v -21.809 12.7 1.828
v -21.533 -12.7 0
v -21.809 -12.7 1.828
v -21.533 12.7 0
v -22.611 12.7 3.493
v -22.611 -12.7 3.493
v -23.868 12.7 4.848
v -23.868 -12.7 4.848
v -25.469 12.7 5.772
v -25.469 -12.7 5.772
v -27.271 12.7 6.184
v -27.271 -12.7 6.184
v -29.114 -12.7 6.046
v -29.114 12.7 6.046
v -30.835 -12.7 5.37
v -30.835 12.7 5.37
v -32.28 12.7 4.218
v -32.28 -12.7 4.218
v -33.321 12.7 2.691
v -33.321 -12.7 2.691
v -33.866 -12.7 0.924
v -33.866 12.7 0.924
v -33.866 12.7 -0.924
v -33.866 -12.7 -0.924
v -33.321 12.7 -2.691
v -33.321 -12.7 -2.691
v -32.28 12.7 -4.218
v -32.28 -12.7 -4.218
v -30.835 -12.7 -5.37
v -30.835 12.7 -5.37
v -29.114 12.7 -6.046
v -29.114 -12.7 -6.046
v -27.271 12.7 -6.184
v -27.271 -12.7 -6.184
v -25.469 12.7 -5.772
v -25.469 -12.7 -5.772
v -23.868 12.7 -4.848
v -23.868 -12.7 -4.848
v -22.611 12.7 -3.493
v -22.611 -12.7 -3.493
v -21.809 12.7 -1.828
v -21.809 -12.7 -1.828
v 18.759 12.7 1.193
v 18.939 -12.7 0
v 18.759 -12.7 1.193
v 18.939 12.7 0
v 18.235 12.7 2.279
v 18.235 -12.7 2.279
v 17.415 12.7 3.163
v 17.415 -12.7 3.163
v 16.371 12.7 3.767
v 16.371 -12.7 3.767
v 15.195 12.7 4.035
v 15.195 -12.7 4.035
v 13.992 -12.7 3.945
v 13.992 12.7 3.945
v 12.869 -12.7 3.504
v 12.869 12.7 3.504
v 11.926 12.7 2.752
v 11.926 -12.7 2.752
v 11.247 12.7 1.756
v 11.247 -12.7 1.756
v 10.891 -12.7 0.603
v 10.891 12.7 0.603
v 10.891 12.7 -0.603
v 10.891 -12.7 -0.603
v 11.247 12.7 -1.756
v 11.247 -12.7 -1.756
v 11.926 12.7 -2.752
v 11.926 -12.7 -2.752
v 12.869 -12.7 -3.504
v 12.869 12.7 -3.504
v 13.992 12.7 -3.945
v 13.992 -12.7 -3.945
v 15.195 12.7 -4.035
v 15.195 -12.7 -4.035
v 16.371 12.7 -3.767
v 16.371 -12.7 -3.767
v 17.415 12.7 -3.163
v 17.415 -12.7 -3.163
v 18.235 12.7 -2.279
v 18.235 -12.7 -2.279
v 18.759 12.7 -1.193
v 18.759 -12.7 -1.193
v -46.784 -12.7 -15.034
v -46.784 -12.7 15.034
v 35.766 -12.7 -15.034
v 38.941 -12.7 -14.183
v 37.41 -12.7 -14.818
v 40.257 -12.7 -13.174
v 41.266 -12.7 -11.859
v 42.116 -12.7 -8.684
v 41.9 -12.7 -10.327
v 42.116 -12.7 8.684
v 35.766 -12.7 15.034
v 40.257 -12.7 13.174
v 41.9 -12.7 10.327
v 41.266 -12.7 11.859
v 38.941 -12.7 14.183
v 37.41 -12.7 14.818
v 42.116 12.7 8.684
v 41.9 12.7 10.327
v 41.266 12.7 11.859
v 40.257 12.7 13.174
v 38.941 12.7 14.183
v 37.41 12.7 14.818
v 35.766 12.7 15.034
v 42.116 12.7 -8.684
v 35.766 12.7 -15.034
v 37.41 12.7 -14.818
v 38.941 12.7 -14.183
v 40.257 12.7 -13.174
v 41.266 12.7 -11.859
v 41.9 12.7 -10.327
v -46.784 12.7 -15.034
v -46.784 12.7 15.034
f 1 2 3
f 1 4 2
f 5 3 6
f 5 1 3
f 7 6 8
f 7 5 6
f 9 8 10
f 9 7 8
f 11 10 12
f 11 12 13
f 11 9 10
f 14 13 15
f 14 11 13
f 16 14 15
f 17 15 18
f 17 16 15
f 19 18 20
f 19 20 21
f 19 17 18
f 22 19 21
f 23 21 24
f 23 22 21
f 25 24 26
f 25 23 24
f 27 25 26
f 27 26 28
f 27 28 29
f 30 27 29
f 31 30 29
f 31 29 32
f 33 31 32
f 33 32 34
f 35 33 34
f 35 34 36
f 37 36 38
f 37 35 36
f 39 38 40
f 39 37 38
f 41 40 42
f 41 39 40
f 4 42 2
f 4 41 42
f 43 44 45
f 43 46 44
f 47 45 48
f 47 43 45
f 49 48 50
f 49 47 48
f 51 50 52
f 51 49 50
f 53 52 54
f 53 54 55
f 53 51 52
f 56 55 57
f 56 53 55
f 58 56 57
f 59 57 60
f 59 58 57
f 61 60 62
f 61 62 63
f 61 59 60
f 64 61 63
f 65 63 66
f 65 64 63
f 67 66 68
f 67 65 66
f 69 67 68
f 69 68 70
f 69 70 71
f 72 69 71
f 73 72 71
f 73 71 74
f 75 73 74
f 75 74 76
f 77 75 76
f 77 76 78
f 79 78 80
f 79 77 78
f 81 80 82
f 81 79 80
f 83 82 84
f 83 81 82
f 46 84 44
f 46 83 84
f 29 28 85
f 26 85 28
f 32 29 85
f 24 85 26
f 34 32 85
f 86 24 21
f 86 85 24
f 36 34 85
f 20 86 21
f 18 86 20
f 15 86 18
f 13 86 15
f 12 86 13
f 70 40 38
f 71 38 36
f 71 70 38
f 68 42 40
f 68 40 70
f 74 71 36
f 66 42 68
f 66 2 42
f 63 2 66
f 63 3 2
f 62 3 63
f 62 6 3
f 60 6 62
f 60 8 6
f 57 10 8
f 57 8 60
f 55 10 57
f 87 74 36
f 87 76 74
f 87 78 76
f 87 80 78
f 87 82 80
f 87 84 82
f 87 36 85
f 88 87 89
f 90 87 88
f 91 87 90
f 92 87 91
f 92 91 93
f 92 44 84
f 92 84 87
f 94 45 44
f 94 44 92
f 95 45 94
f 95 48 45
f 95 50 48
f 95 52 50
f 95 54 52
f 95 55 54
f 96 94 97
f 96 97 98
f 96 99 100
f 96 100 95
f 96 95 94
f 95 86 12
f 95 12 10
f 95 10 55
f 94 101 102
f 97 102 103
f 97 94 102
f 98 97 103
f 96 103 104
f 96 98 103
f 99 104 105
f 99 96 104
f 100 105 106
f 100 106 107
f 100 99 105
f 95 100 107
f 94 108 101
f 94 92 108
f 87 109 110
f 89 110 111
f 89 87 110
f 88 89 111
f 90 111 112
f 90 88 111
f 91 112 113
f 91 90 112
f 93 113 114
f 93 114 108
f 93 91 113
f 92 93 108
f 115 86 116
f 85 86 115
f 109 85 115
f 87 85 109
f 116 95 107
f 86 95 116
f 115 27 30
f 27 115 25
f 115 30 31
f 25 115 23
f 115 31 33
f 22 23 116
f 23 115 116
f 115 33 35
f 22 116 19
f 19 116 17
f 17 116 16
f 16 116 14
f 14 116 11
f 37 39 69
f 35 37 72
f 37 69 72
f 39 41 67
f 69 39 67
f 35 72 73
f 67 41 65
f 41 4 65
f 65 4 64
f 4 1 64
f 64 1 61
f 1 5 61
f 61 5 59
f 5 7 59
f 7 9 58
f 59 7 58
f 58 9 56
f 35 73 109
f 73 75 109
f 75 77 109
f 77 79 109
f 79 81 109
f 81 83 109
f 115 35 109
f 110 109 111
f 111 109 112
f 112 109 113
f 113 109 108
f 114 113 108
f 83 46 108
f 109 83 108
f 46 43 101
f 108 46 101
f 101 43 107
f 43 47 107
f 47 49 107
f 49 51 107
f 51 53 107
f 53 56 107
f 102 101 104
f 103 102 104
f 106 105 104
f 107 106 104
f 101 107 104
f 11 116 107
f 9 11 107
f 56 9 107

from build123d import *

# Parameters (mm, degrees)
F0_R     = 6.2011167501
F0_R_2   = 4.0462607589
F1_DEPTH = 12.7


with BuildPart() as f1:
    # F0 (on Front) → F1 (new body, symmetric)
    with BuildSketch(Plane.XZ):
        with BuildLine():
            Line((35.7664418355, 15.0339733809), (-46.7835581645, 15.0339733809))
            Line((-46.7835581645, 15.0339733809), (-46.7835581645, -15.0339733809))
            Line((-46.7835581645, -15.0339733809), (35.7664418355, -15.0339733809))
            ThreePointArc((35.7664418355, -15.0339733809), (40.256569896, -13.1741014415), (42.1164418355, -8.6839733809))
            Line((42.1164418355, -8.6839733809), (42.1164418355, 8.6839733809))
            ThreePointArc((42.1164418355, 8.6839733809), (40.256569896, 13.1741014415), (35.7664418355, 15.0339733809))
        make_face()
        with Locations((-27.7343895286, 0)):
            Circle(F0_R, mode=Mode.SUBTRACT)
        with Locations((14.892292209, 0)):
            Circle(F0_R_2, mode=Mode.SUBTRACT)
    extrude(amount=F1_DEPTH, both=True)


solid = f1.part
